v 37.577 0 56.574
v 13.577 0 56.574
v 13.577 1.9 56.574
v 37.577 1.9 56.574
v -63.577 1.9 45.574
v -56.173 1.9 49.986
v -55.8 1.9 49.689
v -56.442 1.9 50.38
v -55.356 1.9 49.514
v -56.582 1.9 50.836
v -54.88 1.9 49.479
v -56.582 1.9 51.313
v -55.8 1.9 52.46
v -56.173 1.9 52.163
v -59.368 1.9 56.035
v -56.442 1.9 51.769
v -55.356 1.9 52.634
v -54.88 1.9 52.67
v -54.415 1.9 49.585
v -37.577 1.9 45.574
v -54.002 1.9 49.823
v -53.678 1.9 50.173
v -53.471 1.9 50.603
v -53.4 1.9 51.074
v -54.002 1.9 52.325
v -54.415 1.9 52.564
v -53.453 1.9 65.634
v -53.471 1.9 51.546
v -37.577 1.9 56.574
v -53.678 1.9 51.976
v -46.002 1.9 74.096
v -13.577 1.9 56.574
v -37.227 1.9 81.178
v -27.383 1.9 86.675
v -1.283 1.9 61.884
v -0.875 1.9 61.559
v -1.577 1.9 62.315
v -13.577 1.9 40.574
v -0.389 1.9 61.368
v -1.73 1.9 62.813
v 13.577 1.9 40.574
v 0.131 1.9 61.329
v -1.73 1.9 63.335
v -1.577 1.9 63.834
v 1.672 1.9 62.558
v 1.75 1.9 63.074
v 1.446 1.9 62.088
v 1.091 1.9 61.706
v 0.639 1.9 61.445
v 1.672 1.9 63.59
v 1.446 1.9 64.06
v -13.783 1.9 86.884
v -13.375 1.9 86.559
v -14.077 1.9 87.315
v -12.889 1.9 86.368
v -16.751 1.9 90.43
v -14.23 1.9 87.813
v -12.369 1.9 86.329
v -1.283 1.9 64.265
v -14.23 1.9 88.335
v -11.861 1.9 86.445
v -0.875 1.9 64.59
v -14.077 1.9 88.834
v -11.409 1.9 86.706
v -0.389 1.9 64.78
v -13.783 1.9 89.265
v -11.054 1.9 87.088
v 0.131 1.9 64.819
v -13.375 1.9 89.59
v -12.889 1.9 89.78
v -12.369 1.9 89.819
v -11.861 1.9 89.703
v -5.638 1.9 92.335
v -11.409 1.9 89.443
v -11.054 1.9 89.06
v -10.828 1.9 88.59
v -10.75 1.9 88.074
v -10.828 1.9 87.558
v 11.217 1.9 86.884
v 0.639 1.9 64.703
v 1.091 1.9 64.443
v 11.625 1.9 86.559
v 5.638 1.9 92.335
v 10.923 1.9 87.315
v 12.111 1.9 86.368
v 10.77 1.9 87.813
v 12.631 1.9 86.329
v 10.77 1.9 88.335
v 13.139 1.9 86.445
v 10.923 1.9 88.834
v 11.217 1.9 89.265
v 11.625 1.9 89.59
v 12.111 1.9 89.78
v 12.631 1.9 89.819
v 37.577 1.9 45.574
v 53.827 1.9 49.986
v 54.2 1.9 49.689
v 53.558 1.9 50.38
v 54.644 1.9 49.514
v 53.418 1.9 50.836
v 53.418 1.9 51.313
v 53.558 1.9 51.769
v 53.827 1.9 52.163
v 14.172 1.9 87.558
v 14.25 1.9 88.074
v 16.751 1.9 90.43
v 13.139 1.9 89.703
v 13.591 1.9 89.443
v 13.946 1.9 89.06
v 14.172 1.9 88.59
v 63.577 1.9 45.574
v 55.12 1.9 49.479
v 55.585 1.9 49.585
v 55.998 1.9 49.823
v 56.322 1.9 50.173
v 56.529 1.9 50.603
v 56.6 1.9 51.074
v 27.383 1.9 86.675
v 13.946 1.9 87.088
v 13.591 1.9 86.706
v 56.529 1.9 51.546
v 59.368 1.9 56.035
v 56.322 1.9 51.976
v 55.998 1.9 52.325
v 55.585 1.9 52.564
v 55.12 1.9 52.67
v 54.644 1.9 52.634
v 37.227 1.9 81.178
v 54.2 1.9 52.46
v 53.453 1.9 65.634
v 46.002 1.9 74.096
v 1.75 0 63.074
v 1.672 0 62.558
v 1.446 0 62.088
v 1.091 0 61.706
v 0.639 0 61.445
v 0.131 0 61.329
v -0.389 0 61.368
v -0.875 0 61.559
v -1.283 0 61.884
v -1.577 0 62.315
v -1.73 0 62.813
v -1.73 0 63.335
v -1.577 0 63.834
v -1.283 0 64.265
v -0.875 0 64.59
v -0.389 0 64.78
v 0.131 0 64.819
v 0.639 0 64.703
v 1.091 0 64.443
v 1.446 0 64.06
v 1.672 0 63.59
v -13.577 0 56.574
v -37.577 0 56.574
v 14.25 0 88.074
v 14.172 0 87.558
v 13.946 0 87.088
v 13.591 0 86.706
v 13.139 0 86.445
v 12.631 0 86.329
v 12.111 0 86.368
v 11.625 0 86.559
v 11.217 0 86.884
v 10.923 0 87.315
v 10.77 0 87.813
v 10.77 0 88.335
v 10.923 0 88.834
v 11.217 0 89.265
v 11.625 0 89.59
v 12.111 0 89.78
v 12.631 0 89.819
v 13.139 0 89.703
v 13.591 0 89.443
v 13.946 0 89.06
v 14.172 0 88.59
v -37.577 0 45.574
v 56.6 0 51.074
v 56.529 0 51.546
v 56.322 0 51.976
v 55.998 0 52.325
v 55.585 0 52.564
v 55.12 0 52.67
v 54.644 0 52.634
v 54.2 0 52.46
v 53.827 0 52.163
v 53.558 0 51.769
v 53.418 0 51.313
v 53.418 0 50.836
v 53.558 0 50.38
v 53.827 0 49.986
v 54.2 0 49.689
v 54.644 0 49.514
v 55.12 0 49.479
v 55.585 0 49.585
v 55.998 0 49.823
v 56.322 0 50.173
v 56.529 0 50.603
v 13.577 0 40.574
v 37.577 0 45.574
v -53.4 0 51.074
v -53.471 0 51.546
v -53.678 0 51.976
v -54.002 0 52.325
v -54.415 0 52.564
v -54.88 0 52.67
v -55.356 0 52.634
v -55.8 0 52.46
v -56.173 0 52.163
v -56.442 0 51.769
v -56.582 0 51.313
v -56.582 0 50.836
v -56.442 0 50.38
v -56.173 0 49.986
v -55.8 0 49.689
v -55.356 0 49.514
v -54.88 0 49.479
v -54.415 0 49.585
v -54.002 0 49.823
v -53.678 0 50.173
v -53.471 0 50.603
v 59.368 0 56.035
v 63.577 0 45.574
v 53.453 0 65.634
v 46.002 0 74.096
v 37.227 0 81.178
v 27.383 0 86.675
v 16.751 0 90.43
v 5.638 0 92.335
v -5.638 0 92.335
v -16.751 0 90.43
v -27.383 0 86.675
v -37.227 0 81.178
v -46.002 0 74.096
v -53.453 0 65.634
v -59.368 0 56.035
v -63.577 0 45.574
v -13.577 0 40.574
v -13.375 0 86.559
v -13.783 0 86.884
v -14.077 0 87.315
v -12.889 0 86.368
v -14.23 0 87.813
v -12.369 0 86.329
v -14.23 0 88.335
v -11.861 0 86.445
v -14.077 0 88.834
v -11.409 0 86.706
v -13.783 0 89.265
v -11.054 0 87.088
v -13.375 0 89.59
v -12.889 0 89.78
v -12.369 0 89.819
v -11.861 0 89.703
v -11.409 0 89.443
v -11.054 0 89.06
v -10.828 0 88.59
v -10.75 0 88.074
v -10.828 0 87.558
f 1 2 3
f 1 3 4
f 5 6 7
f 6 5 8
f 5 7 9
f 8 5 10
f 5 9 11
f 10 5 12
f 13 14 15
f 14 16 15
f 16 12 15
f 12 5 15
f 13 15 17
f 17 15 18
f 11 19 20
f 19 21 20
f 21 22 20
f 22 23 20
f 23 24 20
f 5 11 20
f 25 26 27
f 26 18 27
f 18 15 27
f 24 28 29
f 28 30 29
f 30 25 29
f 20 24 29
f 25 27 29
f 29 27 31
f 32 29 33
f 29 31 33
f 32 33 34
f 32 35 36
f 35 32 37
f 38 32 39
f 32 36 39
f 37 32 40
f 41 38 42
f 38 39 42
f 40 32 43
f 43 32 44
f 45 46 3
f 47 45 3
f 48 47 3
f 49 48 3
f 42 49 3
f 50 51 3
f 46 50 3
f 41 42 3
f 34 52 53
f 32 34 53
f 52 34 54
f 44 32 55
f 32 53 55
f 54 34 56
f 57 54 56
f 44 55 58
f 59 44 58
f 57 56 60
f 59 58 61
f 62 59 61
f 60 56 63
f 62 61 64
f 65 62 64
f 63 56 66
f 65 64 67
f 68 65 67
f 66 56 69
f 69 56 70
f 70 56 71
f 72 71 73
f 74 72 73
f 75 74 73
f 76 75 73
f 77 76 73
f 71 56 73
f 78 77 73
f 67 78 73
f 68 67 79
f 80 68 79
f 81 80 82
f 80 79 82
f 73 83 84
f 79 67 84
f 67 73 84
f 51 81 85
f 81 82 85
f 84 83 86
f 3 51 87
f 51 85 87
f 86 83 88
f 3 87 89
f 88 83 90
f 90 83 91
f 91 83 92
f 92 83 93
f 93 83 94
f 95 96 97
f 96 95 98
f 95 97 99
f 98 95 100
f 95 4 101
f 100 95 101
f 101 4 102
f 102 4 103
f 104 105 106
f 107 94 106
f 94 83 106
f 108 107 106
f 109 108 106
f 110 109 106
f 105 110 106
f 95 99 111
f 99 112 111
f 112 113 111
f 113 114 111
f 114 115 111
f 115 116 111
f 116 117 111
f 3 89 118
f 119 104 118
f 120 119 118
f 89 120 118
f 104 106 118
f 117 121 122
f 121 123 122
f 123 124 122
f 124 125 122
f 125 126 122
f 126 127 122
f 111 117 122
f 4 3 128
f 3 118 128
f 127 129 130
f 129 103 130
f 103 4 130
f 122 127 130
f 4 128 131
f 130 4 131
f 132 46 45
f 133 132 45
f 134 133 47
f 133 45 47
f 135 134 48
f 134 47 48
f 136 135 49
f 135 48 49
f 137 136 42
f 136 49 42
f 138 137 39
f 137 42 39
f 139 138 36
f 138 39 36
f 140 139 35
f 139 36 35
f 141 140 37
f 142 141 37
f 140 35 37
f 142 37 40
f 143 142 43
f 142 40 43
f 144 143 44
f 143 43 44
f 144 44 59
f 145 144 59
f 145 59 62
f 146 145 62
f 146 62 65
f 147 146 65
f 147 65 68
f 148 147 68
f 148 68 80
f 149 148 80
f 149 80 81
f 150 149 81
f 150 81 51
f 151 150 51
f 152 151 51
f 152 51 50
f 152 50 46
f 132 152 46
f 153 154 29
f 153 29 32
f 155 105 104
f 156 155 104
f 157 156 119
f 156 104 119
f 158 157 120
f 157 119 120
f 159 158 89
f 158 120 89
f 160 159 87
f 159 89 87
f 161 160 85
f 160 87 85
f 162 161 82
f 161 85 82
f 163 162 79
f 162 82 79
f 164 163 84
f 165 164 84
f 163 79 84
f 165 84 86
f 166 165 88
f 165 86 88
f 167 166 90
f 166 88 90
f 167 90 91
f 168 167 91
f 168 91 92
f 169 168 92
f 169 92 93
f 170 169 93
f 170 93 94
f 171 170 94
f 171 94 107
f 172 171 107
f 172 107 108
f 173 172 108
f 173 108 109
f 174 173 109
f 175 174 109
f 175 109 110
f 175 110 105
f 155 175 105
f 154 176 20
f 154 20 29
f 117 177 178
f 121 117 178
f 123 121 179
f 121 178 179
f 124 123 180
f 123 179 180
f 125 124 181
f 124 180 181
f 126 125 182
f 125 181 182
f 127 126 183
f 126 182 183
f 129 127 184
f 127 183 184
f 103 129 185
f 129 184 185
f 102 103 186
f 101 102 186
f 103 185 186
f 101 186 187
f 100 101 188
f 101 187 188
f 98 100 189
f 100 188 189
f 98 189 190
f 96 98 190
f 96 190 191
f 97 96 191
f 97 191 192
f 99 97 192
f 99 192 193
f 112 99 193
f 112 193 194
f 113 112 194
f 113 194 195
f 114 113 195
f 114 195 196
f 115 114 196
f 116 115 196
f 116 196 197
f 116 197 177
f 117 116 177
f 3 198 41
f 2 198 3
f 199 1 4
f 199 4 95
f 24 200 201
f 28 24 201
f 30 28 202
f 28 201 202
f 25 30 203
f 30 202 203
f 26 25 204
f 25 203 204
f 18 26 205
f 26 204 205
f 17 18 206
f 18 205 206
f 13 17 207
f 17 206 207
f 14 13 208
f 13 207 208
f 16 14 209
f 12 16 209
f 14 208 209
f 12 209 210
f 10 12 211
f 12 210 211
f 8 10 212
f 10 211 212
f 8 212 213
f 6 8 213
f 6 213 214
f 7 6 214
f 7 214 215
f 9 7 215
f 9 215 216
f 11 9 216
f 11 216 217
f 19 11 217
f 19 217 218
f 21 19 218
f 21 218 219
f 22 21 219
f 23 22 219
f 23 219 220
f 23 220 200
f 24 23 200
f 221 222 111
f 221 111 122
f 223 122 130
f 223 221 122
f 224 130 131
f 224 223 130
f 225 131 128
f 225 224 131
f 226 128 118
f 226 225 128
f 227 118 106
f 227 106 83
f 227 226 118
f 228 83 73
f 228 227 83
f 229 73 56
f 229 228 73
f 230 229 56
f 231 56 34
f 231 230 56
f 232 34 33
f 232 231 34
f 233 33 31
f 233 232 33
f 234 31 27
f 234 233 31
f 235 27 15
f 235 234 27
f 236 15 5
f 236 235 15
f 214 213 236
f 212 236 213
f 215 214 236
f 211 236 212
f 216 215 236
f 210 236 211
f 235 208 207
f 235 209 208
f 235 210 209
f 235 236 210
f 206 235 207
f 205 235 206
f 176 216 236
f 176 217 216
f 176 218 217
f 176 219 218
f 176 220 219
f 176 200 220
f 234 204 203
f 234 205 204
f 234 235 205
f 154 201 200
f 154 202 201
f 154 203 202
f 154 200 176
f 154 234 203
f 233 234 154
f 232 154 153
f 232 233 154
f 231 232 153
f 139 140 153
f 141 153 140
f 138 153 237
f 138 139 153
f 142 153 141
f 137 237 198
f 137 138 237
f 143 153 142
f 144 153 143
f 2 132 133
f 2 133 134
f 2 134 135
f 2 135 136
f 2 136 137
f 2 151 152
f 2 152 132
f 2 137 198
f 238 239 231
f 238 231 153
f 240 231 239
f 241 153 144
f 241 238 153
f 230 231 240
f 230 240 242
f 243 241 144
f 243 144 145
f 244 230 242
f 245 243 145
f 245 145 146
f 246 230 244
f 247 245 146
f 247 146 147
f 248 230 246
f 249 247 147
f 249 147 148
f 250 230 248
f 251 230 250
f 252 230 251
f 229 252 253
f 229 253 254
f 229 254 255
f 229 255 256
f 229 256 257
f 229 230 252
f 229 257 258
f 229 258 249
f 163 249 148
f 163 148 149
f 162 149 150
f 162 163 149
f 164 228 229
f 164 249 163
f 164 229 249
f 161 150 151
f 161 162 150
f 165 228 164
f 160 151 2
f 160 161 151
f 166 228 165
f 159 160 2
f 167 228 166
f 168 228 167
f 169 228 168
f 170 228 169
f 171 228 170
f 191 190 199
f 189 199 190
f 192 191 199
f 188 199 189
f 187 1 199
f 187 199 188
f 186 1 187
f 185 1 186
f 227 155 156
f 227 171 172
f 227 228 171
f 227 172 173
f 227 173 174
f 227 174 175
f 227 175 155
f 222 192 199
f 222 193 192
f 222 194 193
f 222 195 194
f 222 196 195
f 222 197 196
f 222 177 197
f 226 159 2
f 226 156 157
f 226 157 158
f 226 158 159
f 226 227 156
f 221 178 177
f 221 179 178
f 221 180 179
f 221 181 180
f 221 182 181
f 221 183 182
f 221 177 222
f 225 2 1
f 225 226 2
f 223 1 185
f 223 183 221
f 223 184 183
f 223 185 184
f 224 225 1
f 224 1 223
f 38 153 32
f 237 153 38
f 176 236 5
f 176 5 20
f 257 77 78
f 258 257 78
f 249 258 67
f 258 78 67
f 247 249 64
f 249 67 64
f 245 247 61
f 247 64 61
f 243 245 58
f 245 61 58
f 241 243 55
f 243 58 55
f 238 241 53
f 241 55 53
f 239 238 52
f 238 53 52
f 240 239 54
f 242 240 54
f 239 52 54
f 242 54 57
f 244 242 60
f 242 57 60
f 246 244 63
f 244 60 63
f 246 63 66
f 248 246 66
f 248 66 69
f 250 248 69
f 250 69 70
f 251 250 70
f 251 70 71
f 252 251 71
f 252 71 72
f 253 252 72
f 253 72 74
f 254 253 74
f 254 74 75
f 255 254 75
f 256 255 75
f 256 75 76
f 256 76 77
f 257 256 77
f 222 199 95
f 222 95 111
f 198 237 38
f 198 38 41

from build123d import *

# Parameters (mm, degrees)
SKETCH1_W           = 36
SKETCH1_H           = 20
BOSS_EXTRUDE1_DEPTH = 1.9
BOSS_EXTRUDE2_DEPTH = 1.9
SKETCH5_W           = 59.232531926
SKETCH5_H           = 32.087665796
CUT_EXTRUDE2_DEPTH  = 10
SKETCH10_R          = 1.75
CUT_EXTRUDE3_DEPTH  = 10
SKETCH11_R          = 1.6
CUT_EXTRUDE4_DEPTH  = 4


with BuildPart() as part:
    # Sketch1 → Boss-Extrude1 (new body)
    with BuildSketch(Plane(origin=(0, 0, 0), x_dir=(1, 0, 0), z_dir=(0, 1, 0))):
        Rectangle(SKETCH1_W, SKETCH1_H)
    extrude(amount=BOSS_EXTRUDE1_DEPTH)

    # Sketch5 → Cut-Extrude2 (cut)
    with BuildSketch(Plane(origin=(0, 1.9, 0), x_dir=(1, 0, 0), z_dir=(0, 1, 0))):
        Rectangle(SKETCH5_W, SKETCH5_H)
    extrude(amount=-CUT_EXTRUDE2_DEPTH, mode=Mode.SUBTRACT)


with BuildPart() as body_2:
    # Sketch3 → Boss-Extrude2 (new body)
    with BuildSketch(Plane.XZ):
        with BuildLine():
            Line((-37.576725301, 45.574302205), (-37.576725301, 56.574302205))
            Line((-37.576725301, 56.574302205), (-13.576725301, 56.574302205))
            Line((-13.576725301, 56.574302205), (-13.576725301, 40.574302205))
            Line((-13.576725301, 40.574302205), (13.576725301, 40.574302205))
            Line((13.576725301, 40.574302205), (13.576725301, 56.574302205))
            Line((13.576725301, 56.574302205), (37.576725301, 56.574302205))
            Line((37.576725301, 56.574302205), (37.576725301, 45.574302205))
            Line((37.576725301, 45.574302205), (63.576725301, 45.574302205))
            ThreePointArc((63.576725301, 45.574302205), (0, 92.574302205), (-63.576725301, 45.574302205))
            Line((-63.576725301, 45.574302205), (-37.576725301, 45.574302205))
        make_face()
    extrude(amount=-BOSS_EXTRUDE2_DEPTH)

    # Sketch10 → Cut-Extrude3 (cut)
    with BuildSketch(Plane(origin=(0, 1.9, 0), x_dir=(1, 0, 0), z_dir=(0, 1, 0))):
        with Locations((-12.5, -88.074302205)):
            Circle(SKETCH10_R)
        with Locations((12.5, -88.074302205)):
            Circle(SKETCH10_R)
        with Locations((0, -63.074302205)):
            Circle(SKETCH10_R)
    extrude(amount=-CUT_EXTRUDE3_DEPTH, mode=Mode.SUBTRACT)

    # Sketch11 → Cut-Extrude4 (cut)
    with BuildSketch(Plane.XZ):
        with Locations((-55, 51.074302205)):
            Circle(SKETCH11_R)
        with Locations((55, 51.074302205)):
            Circle(SKETCH11_R)
    extrude(amount=-CUT_EXTRUDE4_DEPTH, mode=Mode.SUBTRACT)


solid = body_2.part
